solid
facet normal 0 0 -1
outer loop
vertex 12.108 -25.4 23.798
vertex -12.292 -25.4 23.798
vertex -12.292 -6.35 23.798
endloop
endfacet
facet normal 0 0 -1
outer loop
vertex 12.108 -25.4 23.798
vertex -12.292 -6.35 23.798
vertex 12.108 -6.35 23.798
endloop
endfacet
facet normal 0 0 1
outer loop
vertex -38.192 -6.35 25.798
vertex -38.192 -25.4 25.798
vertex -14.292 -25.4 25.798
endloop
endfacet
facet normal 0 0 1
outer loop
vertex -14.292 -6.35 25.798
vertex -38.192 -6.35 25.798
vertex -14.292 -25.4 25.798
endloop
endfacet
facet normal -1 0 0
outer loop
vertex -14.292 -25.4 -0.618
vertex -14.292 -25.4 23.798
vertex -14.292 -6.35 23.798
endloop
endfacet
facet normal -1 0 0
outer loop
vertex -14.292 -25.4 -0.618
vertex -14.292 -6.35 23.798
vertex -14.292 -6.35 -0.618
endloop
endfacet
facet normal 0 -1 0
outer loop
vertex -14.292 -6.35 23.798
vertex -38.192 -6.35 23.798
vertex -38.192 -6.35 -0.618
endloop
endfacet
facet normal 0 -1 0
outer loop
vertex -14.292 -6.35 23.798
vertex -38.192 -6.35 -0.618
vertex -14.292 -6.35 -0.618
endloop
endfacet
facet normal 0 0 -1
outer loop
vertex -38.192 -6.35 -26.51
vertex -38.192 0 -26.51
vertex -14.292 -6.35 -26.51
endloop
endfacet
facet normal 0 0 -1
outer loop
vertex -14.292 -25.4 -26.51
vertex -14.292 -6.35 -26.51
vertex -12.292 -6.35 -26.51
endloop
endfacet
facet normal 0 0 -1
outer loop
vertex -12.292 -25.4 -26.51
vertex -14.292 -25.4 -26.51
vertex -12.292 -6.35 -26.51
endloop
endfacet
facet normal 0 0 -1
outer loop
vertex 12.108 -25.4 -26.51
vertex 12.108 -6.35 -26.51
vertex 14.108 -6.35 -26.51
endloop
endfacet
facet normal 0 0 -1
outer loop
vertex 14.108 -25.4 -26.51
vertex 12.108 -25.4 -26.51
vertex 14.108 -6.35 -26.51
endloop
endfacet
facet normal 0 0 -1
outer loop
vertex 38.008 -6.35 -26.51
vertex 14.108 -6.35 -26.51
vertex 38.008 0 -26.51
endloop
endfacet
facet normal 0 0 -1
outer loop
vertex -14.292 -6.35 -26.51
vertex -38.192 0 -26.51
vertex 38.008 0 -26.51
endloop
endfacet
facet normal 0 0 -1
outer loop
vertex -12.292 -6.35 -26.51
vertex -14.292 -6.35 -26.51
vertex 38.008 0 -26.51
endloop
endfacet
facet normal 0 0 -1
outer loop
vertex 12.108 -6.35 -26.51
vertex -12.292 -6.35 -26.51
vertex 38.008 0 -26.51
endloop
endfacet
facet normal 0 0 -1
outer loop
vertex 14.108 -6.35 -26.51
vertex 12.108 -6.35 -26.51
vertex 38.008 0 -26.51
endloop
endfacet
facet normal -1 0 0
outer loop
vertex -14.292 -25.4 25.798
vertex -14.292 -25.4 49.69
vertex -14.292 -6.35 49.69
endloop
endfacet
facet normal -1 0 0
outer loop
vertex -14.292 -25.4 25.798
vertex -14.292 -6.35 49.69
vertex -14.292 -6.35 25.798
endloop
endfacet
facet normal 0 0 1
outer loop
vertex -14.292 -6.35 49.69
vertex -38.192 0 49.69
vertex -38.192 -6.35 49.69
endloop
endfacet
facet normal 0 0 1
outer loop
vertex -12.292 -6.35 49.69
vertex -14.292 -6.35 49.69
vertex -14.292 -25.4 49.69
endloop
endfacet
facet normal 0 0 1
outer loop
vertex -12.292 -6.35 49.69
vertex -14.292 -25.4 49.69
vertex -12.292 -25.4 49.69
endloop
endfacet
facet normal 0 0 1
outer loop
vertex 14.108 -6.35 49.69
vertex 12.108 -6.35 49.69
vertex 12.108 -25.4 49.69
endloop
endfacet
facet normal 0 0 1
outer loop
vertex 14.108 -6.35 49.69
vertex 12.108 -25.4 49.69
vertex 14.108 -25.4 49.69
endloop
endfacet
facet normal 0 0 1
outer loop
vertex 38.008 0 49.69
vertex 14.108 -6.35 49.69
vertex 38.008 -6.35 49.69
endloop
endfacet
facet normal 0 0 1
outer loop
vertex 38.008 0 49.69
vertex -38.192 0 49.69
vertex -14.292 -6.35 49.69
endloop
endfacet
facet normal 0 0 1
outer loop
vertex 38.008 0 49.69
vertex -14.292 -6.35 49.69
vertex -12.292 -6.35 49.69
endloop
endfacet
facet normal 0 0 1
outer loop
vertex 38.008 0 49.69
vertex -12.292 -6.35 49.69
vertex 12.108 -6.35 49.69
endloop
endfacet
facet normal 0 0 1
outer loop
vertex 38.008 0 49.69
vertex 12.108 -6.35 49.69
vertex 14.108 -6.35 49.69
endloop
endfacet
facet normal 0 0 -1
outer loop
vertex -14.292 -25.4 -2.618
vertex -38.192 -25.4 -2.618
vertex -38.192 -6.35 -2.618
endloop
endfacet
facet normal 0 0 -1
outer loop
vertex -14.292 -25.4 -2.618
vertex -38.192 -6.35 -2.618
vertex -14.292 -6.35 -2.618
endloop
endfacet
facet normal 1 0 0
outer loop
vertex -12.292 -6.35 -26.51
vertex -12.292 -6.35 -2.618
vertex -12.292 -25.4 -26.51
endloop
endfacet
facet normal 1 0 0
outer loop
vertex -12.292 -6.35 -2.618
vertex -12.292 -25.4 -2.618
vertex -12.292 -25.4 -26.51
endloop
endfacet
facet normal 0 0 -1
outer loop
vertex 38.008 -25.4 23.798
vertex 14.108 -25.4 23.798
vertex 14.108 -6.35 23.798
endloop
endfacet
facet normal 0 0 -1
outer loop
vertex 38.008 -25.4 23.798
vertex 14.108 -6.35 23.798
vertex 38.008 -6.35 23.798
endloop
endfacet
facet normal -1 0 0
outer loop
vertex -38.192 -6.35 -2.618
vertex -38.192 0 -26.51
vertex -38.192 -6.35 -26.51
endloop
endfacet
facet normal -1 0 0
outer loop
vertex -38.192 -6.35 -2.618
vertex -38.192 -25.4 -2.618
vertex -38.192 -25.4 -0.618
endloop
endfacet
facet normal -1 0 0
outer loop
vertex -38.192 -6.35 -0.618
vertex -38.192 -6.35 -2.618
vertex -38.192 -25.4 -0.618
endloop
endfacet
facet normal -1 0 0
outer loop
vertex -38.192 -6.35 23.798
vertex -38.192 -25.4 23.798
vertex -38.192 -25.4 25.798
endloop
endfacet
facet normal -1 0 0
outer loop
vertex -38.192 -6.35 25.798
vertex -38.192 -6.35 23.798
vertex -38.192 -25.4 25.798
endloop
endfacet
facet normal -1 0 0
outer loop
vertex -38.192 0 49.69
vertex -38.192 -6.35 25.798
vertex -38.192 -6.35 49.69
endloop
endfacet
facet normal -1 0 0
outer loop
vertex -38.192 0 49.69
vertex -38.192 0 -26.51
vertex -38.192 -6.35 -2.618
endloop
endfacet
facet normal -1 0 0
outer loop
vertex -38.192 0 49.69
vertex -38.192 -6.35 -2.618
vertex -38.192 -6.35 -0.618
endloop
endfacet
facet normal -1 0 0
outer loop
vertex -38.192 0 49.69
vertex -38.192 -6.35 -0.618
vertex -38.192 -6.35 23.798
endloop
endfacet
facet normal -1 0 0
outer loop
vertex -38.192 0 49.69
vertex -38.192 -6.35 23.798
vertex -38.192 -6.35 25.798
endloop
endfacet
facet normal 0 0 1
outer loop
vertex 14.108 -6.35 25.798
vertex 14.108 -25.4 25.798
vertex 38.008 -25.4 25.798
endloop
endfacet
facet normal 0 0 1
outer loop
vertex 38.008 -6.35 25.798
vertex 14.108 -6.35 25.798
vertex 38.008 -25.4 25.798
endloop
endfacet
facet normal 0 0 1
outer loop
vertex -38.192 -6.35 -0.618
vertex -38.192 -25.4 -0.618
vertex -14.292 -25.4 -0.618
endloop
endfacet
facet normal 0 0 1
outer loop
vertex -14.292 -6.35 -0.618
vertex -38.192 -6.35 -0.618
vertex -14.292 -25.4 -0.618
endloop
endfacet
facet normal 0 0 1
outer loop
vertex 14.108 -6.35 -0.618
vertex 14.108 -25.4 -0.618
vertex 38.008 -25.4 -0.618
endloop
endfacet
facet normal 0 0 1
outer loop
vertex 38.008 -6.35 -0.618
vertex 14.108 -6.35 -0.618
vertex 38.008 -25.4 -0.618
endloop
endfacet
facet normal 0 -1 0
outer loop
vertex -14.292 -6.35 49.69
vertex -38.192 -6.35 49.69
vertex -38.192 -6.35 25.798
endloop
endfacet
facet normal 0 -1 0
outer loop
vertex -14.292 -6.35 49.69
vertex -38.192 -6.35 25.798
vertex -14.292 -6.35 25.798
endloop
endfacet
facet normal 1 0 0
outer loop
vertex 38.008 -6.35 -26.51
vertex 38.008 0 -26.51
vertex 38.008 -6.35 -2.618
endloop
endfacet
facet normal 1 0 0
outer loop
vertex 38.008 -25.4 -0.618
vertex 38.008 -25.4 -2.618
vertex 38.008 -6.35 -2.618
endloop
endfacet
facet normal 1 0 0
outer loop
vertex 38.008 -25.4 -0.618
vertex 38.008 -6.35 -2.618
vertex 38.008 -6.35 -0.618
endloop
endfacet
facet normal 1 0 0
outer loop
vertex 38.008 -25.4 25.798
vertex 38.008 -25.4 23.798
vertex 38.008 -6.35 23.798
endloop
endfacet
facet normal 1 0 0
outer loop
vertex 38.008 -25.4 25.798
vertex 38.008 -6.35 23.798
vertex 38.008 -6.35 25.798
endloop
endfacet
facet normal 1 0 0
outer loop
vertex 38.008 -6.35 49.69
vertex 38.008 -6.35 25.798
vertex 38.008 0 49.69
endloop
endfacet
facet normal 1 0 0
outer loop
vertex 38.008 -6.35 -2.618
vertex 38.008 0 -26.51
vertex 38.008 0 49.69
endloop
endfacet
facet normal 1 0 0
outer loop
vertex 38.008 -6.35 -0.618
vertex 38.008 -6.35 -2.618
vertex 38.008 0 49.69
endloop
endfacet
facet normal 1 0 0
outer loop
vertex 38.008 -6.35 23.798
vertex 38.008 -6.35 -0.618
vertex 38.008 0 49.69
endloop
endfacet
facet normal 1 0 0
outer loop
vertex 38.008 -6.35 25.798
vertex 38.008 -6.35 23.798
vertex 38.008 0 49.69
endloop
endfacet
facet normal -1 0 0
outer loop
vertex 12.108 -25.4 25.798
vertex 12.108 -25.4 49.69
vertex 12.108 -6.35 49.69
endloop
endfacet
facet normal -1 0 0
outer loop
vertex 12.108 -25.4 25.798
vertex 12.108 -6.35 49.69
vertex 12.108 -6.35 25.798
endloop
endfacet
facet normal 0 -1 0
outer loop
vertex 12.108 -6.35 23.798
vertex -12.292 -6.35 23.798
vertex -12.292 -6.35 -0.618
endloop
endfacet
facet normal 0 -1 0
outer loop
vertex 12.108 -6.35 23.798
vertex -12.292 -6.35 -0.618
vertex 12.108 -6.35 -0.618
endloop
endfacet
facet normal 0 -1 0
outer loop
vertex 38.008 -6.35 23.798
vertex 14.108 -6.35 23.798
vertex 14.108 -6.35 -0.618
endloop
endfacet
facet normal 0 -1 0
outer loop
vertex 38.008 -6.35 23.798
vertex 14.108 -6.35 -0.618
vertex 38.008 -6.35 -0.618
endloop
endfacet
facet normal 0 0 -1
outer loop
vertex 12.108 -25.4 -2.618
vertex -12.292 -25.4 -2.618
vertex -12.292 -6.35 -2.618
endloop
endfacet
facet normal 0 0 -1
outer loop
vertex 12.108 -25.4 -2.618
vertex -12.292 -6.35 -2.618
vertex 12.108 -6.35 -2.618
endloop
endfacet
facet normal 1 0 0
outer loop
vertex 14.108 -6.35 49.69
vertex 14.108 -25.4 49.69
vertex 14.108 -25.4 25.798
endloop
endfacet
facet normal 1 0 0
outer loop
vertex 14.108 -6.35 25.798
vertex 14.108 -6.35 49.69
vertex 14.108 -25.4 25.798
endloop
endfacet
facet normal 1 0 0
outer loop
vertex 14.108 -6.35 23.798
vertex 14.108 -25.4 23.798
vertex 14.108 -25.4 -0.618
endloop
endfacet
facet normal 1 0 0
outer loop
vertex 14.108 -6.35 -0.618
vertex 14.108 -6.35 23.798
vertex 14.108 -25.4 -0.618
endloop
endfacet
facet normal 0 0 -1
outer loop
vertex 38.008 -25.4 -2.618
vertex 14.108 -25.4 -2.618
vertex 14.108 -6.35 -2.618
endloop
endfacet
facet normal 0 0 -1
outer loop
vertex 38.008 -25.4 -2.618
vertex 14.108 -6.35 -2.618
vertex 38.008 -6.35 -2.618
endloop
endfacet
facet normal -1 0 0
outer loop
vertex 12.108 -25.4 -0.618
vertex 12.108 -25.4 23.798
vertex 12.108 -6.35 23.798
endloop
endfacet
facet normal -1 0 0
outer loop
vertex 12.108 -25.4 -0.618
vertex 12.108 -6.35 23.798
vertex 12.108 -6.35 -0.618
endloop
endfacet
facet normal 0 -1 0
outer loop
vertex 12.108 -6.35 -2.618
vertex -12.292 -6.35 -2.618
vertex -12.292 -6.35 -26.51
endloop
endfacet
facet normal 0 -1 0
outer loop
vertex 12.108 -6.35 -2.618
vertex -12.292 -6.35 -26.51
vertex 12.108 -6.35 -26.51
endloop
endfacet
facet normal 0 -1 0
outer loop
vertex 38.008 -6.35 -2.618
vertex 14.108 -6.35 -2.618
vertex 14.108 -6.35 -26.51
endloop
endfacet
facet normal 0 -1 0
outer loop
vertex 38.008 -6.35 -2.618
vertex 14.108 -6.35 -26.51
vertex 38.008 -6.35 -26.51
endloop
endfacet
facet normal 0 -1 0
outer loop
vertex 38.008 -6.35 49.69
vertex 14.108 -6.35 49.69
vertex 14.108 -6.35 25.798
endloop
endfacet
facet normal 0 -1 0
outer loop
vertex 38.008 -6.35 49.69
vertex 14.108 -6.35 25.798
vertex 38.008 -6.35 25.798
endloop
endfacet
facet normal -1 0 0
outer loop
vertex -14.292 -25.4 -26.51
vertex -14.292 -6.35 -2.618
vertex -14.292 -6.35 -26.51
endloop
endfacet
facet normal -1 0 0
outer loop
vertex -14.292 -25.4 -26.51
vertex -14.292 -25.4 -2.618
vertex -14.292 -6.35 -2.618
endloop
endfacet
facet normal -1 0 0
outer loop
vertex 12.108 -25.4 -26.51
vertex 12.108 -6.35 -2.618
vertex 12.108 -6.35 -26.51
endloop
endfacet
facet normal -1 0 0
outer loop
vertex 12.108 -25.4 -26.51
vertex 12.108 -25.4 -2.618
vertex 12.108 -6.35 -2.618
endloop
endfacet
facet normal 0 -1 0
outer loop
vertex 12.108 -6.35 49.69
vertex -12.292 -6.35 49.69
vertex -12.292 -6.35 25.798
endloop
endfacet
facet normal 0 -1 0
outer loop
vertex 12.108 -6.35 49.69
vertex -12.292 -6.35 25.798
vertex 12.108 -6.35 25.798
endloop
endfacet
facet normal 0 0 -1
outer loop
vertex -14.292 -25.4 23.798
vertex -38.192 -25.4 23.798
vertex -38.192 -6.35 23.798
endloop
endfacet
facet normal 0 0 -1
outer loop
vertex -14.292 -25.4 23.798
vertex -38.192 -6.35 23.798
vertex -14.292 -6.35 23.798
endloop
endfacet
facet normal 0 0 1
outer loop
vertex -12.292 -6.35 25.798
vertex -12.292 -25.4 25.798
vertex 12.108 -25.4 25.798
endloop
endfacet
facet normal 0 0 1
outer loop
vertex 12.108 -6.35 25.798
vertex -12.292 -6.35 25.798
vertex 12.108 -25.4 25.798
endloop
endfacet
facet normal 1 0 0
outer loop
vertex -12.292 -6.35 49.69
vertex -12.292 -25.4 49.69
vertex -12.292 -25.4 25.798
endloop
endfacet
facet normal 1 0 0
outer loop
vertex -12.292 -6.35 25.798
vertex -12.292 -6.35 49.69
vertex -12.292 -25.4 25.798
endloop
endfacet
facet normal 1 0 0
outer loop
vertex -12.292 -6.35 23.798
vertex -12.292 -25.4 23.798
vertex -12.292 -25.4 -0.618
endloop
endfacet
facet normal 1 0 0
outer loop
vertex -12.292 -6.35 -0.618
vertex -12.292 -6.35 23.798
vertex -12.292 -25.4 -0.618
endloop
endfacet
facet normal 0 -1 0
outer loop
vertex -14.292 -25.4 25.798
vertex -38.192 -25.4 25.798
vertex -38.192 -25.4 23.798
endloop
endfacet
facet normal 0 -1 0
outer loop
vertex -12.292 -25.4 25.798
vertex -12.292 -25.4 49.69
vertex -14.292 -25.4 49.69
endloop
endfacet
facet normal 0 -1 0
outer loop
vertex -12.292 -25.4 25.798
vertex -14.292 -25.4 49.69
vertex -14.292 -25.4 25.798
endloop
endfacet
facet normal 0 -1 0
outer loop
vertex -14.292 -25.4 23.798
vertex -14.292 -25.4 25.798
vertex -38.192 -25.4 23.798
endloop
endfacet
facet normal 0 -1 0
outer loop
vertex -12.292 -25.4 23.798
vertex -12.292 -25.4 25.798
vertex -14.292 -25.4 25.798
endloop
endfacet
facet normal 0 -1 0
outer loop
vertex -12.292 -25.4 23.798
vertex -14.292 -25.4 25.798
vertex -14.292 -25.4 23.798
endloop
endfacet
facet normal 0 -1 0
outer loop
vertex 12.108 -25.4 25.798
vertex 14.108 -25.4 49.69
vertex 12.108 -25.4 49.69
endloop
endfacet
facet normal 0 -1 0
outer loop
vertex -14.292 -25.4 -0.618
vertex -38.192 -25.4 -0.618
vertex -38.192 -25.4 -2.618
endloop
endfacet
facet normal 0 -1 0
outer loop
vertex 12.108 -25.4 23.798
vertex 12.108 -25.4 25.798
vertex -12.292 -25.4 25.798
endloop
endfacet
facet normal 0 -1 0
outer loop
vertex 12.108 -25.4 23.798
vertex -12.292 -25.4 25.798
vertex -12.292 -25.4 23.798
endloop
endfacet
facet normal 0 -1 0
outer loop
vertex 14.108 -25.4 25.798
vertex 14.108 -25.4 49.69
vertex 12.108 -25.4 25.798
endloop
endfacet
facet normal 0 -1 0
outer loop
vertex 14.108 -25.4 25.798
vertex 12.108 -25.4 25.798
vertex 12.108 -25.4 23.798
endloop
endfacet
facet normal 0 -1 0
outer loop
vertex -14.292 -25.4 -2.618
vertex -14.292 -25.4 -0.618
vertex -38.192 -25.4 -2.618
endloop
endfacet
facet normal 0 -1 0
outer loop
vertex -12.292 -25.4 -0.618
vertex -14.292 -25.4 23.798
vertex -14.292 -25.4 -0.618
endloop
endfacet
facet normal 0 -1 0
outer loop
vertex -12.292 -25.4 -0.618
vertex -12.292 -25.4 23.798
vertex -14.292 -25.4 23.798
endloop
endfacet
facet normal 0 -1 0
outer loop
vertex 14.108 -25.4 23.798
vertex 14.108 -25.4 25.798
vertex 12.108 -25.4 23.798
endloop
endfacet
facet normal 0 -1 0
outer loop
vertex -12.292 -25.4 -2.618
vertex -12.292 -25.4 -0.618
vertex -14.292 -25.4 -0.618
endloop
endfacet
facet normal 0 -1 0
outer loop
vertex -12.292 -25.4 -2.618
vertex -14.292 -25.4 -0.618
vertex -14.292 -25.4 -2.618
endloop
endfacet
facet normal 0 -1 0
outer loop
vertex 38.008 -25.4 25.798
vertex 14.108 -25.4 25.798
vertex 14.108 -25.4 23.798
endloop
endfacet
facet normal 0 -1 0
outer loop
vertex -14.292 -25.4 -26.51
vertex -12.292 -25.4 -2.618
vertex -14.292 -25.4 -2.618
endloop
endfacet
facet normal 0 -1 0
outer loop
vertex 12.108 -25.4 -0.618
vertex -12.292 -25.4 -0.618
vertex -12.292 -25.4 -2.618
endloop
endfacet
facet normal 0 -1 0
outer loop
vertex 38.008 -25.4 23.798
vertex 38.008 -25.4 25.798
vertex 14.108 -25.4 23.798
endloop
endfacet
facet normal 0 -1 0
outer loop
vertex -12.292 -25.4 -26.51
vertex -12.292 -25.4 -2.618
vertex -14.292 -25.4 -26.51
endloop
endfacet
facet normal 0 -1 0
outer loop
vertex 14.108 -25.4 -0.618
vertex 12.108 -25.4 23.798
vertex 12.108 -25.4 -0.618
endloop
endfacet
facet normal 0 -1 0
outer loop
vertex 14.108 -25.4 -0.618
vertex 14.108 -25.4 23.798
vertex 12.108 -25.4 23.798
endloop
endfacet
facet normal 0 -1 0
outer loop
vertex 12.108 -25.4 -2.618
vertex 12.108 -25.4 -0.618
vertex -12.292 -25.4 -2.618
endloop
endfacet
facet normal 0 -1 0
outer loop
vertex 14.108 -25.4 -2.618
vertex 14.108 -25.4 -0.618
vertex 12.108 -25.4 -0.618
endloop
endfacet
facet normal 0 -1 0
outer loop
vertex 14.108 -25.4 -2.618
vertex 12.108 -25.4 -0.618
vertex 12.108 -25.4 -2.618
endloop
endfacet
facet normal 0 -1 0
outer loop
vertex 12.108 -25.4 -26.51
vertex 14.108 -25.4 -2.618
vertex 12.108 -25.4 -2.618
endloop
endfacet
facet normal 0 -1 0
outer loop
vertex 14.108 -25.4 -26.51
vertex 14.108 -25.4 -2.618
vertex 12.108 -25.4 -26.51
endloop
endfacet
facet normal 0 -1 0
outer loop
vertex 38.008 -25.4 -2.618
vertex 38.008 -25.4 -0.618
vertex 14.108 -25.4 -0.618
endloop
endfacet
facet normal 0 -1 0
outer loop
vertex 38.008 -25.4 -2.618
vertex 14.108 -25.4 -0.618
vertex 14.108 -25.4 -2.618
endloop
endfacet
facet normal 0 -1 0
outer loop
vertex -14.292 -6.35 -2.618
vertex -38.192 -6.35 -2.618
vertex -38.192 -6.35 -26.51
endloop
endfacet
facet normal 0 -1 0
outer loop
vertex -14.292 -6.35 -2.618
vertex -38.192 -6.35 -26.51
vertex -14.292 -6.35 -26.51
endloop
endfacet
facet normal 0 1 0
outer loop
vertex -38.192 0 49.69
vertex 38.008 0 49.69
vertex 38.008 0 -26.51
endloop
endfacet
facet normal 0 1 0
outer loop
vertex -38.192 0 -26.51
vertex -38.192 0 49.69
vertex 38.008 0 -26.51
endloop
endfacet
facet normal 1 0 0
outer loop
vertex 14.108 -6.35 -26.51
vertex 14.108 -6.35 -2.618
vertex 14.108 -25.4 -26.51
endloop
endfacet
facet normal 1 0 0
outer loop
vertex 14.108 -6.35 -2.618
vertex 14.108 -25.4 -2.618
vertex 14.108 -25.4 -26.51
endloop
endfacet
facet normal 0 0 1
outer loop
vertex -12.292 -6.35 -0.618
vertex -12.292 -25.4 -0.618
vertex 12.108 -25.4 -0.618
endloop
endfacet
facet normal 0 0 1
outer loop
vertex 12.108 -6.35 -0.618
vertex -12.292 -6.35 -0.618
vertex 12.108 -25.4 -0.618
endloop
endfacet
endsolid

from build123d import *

# Parameters (mm, degrees)
F0_W     = 76.2
F0_H     = 76.2
F3_DEPTH = 6.35
F6_E7_W  = 76.2
F6_E7_H  = 25.4
F7_DEPTH = 2.00000108
F6_E9_W  = 76.2
F6_E9_H  = 25.4
F8_DEPTH = 2.00000108
F5_E11_W = 76.2
F5_E11_H = 25.4
F5_E5_W  = 76.2
F5_E5_H  = 25.4
F9_DEPTH = 2.00000108


# Not quite as in the source:
# - the program builds the solid bodies; features that only make, move or delete a surface that nothing else refers to are left out


with BuildPart() as f3:
    # F0 (on Front) → F3 (new body)
    with BuildSketch(Plane.XZ):
        with Locations((-0.0921785831, 11.5903750752)):
            Rectangle(F0_W, F0_H)
    extrude(amount=F3_DEPTH)

    # F6_E7 (on explicit) → F7 (join)
    with BuildSketch(Plane(origin=(-38.1921785831, 0, 25.7983756152), x_dir=(1, 0, 0), z_dir=(0, 0, -1))):
        with Locations((38.1, 12.7)):
            Rectangle(F6_E7_W, F6_E7_H)
    extrude(amount=F7_DEPTH)

    # F6_E9 (on explicit) → F8 (join)
    with BuildSketch(Plane(origin=(-38.1921785831, 0, -0.6176243848), x_dir=(1, 0, 0), z_dir=(0, 0, -1))):
        with Locations((38.1, 12.7)):
            Rectangle(F6_E9_W, F6_E9_H)
    extrude(amount=F8_DEPTH)

    # F5_E11 (on explicit) + F5_E5 (on explicit) → F9 (join)
    with BuildSketch(Plane(origin=(-12.2921770431, 0, 49.6903750752), x_dir=(0, 0, -1), z_dir=(-1, 0, 0))):
        with Locations((38.1, 12.7)):
            Rectangle(F5_E11_W, F5_E11_H)
    with BuildSketch(Plane(origin=(14.1078209569, 0, 49.6903750752), x_dir=(0, 0, -1), z_dir=(-1, 0, 0))):
        with Locations((38.1, 12.7)):
            Rectangle(F5_E5_W, F5_E5_H)
    extrude(amount=F9_DEPTH)


solid = f3.part
